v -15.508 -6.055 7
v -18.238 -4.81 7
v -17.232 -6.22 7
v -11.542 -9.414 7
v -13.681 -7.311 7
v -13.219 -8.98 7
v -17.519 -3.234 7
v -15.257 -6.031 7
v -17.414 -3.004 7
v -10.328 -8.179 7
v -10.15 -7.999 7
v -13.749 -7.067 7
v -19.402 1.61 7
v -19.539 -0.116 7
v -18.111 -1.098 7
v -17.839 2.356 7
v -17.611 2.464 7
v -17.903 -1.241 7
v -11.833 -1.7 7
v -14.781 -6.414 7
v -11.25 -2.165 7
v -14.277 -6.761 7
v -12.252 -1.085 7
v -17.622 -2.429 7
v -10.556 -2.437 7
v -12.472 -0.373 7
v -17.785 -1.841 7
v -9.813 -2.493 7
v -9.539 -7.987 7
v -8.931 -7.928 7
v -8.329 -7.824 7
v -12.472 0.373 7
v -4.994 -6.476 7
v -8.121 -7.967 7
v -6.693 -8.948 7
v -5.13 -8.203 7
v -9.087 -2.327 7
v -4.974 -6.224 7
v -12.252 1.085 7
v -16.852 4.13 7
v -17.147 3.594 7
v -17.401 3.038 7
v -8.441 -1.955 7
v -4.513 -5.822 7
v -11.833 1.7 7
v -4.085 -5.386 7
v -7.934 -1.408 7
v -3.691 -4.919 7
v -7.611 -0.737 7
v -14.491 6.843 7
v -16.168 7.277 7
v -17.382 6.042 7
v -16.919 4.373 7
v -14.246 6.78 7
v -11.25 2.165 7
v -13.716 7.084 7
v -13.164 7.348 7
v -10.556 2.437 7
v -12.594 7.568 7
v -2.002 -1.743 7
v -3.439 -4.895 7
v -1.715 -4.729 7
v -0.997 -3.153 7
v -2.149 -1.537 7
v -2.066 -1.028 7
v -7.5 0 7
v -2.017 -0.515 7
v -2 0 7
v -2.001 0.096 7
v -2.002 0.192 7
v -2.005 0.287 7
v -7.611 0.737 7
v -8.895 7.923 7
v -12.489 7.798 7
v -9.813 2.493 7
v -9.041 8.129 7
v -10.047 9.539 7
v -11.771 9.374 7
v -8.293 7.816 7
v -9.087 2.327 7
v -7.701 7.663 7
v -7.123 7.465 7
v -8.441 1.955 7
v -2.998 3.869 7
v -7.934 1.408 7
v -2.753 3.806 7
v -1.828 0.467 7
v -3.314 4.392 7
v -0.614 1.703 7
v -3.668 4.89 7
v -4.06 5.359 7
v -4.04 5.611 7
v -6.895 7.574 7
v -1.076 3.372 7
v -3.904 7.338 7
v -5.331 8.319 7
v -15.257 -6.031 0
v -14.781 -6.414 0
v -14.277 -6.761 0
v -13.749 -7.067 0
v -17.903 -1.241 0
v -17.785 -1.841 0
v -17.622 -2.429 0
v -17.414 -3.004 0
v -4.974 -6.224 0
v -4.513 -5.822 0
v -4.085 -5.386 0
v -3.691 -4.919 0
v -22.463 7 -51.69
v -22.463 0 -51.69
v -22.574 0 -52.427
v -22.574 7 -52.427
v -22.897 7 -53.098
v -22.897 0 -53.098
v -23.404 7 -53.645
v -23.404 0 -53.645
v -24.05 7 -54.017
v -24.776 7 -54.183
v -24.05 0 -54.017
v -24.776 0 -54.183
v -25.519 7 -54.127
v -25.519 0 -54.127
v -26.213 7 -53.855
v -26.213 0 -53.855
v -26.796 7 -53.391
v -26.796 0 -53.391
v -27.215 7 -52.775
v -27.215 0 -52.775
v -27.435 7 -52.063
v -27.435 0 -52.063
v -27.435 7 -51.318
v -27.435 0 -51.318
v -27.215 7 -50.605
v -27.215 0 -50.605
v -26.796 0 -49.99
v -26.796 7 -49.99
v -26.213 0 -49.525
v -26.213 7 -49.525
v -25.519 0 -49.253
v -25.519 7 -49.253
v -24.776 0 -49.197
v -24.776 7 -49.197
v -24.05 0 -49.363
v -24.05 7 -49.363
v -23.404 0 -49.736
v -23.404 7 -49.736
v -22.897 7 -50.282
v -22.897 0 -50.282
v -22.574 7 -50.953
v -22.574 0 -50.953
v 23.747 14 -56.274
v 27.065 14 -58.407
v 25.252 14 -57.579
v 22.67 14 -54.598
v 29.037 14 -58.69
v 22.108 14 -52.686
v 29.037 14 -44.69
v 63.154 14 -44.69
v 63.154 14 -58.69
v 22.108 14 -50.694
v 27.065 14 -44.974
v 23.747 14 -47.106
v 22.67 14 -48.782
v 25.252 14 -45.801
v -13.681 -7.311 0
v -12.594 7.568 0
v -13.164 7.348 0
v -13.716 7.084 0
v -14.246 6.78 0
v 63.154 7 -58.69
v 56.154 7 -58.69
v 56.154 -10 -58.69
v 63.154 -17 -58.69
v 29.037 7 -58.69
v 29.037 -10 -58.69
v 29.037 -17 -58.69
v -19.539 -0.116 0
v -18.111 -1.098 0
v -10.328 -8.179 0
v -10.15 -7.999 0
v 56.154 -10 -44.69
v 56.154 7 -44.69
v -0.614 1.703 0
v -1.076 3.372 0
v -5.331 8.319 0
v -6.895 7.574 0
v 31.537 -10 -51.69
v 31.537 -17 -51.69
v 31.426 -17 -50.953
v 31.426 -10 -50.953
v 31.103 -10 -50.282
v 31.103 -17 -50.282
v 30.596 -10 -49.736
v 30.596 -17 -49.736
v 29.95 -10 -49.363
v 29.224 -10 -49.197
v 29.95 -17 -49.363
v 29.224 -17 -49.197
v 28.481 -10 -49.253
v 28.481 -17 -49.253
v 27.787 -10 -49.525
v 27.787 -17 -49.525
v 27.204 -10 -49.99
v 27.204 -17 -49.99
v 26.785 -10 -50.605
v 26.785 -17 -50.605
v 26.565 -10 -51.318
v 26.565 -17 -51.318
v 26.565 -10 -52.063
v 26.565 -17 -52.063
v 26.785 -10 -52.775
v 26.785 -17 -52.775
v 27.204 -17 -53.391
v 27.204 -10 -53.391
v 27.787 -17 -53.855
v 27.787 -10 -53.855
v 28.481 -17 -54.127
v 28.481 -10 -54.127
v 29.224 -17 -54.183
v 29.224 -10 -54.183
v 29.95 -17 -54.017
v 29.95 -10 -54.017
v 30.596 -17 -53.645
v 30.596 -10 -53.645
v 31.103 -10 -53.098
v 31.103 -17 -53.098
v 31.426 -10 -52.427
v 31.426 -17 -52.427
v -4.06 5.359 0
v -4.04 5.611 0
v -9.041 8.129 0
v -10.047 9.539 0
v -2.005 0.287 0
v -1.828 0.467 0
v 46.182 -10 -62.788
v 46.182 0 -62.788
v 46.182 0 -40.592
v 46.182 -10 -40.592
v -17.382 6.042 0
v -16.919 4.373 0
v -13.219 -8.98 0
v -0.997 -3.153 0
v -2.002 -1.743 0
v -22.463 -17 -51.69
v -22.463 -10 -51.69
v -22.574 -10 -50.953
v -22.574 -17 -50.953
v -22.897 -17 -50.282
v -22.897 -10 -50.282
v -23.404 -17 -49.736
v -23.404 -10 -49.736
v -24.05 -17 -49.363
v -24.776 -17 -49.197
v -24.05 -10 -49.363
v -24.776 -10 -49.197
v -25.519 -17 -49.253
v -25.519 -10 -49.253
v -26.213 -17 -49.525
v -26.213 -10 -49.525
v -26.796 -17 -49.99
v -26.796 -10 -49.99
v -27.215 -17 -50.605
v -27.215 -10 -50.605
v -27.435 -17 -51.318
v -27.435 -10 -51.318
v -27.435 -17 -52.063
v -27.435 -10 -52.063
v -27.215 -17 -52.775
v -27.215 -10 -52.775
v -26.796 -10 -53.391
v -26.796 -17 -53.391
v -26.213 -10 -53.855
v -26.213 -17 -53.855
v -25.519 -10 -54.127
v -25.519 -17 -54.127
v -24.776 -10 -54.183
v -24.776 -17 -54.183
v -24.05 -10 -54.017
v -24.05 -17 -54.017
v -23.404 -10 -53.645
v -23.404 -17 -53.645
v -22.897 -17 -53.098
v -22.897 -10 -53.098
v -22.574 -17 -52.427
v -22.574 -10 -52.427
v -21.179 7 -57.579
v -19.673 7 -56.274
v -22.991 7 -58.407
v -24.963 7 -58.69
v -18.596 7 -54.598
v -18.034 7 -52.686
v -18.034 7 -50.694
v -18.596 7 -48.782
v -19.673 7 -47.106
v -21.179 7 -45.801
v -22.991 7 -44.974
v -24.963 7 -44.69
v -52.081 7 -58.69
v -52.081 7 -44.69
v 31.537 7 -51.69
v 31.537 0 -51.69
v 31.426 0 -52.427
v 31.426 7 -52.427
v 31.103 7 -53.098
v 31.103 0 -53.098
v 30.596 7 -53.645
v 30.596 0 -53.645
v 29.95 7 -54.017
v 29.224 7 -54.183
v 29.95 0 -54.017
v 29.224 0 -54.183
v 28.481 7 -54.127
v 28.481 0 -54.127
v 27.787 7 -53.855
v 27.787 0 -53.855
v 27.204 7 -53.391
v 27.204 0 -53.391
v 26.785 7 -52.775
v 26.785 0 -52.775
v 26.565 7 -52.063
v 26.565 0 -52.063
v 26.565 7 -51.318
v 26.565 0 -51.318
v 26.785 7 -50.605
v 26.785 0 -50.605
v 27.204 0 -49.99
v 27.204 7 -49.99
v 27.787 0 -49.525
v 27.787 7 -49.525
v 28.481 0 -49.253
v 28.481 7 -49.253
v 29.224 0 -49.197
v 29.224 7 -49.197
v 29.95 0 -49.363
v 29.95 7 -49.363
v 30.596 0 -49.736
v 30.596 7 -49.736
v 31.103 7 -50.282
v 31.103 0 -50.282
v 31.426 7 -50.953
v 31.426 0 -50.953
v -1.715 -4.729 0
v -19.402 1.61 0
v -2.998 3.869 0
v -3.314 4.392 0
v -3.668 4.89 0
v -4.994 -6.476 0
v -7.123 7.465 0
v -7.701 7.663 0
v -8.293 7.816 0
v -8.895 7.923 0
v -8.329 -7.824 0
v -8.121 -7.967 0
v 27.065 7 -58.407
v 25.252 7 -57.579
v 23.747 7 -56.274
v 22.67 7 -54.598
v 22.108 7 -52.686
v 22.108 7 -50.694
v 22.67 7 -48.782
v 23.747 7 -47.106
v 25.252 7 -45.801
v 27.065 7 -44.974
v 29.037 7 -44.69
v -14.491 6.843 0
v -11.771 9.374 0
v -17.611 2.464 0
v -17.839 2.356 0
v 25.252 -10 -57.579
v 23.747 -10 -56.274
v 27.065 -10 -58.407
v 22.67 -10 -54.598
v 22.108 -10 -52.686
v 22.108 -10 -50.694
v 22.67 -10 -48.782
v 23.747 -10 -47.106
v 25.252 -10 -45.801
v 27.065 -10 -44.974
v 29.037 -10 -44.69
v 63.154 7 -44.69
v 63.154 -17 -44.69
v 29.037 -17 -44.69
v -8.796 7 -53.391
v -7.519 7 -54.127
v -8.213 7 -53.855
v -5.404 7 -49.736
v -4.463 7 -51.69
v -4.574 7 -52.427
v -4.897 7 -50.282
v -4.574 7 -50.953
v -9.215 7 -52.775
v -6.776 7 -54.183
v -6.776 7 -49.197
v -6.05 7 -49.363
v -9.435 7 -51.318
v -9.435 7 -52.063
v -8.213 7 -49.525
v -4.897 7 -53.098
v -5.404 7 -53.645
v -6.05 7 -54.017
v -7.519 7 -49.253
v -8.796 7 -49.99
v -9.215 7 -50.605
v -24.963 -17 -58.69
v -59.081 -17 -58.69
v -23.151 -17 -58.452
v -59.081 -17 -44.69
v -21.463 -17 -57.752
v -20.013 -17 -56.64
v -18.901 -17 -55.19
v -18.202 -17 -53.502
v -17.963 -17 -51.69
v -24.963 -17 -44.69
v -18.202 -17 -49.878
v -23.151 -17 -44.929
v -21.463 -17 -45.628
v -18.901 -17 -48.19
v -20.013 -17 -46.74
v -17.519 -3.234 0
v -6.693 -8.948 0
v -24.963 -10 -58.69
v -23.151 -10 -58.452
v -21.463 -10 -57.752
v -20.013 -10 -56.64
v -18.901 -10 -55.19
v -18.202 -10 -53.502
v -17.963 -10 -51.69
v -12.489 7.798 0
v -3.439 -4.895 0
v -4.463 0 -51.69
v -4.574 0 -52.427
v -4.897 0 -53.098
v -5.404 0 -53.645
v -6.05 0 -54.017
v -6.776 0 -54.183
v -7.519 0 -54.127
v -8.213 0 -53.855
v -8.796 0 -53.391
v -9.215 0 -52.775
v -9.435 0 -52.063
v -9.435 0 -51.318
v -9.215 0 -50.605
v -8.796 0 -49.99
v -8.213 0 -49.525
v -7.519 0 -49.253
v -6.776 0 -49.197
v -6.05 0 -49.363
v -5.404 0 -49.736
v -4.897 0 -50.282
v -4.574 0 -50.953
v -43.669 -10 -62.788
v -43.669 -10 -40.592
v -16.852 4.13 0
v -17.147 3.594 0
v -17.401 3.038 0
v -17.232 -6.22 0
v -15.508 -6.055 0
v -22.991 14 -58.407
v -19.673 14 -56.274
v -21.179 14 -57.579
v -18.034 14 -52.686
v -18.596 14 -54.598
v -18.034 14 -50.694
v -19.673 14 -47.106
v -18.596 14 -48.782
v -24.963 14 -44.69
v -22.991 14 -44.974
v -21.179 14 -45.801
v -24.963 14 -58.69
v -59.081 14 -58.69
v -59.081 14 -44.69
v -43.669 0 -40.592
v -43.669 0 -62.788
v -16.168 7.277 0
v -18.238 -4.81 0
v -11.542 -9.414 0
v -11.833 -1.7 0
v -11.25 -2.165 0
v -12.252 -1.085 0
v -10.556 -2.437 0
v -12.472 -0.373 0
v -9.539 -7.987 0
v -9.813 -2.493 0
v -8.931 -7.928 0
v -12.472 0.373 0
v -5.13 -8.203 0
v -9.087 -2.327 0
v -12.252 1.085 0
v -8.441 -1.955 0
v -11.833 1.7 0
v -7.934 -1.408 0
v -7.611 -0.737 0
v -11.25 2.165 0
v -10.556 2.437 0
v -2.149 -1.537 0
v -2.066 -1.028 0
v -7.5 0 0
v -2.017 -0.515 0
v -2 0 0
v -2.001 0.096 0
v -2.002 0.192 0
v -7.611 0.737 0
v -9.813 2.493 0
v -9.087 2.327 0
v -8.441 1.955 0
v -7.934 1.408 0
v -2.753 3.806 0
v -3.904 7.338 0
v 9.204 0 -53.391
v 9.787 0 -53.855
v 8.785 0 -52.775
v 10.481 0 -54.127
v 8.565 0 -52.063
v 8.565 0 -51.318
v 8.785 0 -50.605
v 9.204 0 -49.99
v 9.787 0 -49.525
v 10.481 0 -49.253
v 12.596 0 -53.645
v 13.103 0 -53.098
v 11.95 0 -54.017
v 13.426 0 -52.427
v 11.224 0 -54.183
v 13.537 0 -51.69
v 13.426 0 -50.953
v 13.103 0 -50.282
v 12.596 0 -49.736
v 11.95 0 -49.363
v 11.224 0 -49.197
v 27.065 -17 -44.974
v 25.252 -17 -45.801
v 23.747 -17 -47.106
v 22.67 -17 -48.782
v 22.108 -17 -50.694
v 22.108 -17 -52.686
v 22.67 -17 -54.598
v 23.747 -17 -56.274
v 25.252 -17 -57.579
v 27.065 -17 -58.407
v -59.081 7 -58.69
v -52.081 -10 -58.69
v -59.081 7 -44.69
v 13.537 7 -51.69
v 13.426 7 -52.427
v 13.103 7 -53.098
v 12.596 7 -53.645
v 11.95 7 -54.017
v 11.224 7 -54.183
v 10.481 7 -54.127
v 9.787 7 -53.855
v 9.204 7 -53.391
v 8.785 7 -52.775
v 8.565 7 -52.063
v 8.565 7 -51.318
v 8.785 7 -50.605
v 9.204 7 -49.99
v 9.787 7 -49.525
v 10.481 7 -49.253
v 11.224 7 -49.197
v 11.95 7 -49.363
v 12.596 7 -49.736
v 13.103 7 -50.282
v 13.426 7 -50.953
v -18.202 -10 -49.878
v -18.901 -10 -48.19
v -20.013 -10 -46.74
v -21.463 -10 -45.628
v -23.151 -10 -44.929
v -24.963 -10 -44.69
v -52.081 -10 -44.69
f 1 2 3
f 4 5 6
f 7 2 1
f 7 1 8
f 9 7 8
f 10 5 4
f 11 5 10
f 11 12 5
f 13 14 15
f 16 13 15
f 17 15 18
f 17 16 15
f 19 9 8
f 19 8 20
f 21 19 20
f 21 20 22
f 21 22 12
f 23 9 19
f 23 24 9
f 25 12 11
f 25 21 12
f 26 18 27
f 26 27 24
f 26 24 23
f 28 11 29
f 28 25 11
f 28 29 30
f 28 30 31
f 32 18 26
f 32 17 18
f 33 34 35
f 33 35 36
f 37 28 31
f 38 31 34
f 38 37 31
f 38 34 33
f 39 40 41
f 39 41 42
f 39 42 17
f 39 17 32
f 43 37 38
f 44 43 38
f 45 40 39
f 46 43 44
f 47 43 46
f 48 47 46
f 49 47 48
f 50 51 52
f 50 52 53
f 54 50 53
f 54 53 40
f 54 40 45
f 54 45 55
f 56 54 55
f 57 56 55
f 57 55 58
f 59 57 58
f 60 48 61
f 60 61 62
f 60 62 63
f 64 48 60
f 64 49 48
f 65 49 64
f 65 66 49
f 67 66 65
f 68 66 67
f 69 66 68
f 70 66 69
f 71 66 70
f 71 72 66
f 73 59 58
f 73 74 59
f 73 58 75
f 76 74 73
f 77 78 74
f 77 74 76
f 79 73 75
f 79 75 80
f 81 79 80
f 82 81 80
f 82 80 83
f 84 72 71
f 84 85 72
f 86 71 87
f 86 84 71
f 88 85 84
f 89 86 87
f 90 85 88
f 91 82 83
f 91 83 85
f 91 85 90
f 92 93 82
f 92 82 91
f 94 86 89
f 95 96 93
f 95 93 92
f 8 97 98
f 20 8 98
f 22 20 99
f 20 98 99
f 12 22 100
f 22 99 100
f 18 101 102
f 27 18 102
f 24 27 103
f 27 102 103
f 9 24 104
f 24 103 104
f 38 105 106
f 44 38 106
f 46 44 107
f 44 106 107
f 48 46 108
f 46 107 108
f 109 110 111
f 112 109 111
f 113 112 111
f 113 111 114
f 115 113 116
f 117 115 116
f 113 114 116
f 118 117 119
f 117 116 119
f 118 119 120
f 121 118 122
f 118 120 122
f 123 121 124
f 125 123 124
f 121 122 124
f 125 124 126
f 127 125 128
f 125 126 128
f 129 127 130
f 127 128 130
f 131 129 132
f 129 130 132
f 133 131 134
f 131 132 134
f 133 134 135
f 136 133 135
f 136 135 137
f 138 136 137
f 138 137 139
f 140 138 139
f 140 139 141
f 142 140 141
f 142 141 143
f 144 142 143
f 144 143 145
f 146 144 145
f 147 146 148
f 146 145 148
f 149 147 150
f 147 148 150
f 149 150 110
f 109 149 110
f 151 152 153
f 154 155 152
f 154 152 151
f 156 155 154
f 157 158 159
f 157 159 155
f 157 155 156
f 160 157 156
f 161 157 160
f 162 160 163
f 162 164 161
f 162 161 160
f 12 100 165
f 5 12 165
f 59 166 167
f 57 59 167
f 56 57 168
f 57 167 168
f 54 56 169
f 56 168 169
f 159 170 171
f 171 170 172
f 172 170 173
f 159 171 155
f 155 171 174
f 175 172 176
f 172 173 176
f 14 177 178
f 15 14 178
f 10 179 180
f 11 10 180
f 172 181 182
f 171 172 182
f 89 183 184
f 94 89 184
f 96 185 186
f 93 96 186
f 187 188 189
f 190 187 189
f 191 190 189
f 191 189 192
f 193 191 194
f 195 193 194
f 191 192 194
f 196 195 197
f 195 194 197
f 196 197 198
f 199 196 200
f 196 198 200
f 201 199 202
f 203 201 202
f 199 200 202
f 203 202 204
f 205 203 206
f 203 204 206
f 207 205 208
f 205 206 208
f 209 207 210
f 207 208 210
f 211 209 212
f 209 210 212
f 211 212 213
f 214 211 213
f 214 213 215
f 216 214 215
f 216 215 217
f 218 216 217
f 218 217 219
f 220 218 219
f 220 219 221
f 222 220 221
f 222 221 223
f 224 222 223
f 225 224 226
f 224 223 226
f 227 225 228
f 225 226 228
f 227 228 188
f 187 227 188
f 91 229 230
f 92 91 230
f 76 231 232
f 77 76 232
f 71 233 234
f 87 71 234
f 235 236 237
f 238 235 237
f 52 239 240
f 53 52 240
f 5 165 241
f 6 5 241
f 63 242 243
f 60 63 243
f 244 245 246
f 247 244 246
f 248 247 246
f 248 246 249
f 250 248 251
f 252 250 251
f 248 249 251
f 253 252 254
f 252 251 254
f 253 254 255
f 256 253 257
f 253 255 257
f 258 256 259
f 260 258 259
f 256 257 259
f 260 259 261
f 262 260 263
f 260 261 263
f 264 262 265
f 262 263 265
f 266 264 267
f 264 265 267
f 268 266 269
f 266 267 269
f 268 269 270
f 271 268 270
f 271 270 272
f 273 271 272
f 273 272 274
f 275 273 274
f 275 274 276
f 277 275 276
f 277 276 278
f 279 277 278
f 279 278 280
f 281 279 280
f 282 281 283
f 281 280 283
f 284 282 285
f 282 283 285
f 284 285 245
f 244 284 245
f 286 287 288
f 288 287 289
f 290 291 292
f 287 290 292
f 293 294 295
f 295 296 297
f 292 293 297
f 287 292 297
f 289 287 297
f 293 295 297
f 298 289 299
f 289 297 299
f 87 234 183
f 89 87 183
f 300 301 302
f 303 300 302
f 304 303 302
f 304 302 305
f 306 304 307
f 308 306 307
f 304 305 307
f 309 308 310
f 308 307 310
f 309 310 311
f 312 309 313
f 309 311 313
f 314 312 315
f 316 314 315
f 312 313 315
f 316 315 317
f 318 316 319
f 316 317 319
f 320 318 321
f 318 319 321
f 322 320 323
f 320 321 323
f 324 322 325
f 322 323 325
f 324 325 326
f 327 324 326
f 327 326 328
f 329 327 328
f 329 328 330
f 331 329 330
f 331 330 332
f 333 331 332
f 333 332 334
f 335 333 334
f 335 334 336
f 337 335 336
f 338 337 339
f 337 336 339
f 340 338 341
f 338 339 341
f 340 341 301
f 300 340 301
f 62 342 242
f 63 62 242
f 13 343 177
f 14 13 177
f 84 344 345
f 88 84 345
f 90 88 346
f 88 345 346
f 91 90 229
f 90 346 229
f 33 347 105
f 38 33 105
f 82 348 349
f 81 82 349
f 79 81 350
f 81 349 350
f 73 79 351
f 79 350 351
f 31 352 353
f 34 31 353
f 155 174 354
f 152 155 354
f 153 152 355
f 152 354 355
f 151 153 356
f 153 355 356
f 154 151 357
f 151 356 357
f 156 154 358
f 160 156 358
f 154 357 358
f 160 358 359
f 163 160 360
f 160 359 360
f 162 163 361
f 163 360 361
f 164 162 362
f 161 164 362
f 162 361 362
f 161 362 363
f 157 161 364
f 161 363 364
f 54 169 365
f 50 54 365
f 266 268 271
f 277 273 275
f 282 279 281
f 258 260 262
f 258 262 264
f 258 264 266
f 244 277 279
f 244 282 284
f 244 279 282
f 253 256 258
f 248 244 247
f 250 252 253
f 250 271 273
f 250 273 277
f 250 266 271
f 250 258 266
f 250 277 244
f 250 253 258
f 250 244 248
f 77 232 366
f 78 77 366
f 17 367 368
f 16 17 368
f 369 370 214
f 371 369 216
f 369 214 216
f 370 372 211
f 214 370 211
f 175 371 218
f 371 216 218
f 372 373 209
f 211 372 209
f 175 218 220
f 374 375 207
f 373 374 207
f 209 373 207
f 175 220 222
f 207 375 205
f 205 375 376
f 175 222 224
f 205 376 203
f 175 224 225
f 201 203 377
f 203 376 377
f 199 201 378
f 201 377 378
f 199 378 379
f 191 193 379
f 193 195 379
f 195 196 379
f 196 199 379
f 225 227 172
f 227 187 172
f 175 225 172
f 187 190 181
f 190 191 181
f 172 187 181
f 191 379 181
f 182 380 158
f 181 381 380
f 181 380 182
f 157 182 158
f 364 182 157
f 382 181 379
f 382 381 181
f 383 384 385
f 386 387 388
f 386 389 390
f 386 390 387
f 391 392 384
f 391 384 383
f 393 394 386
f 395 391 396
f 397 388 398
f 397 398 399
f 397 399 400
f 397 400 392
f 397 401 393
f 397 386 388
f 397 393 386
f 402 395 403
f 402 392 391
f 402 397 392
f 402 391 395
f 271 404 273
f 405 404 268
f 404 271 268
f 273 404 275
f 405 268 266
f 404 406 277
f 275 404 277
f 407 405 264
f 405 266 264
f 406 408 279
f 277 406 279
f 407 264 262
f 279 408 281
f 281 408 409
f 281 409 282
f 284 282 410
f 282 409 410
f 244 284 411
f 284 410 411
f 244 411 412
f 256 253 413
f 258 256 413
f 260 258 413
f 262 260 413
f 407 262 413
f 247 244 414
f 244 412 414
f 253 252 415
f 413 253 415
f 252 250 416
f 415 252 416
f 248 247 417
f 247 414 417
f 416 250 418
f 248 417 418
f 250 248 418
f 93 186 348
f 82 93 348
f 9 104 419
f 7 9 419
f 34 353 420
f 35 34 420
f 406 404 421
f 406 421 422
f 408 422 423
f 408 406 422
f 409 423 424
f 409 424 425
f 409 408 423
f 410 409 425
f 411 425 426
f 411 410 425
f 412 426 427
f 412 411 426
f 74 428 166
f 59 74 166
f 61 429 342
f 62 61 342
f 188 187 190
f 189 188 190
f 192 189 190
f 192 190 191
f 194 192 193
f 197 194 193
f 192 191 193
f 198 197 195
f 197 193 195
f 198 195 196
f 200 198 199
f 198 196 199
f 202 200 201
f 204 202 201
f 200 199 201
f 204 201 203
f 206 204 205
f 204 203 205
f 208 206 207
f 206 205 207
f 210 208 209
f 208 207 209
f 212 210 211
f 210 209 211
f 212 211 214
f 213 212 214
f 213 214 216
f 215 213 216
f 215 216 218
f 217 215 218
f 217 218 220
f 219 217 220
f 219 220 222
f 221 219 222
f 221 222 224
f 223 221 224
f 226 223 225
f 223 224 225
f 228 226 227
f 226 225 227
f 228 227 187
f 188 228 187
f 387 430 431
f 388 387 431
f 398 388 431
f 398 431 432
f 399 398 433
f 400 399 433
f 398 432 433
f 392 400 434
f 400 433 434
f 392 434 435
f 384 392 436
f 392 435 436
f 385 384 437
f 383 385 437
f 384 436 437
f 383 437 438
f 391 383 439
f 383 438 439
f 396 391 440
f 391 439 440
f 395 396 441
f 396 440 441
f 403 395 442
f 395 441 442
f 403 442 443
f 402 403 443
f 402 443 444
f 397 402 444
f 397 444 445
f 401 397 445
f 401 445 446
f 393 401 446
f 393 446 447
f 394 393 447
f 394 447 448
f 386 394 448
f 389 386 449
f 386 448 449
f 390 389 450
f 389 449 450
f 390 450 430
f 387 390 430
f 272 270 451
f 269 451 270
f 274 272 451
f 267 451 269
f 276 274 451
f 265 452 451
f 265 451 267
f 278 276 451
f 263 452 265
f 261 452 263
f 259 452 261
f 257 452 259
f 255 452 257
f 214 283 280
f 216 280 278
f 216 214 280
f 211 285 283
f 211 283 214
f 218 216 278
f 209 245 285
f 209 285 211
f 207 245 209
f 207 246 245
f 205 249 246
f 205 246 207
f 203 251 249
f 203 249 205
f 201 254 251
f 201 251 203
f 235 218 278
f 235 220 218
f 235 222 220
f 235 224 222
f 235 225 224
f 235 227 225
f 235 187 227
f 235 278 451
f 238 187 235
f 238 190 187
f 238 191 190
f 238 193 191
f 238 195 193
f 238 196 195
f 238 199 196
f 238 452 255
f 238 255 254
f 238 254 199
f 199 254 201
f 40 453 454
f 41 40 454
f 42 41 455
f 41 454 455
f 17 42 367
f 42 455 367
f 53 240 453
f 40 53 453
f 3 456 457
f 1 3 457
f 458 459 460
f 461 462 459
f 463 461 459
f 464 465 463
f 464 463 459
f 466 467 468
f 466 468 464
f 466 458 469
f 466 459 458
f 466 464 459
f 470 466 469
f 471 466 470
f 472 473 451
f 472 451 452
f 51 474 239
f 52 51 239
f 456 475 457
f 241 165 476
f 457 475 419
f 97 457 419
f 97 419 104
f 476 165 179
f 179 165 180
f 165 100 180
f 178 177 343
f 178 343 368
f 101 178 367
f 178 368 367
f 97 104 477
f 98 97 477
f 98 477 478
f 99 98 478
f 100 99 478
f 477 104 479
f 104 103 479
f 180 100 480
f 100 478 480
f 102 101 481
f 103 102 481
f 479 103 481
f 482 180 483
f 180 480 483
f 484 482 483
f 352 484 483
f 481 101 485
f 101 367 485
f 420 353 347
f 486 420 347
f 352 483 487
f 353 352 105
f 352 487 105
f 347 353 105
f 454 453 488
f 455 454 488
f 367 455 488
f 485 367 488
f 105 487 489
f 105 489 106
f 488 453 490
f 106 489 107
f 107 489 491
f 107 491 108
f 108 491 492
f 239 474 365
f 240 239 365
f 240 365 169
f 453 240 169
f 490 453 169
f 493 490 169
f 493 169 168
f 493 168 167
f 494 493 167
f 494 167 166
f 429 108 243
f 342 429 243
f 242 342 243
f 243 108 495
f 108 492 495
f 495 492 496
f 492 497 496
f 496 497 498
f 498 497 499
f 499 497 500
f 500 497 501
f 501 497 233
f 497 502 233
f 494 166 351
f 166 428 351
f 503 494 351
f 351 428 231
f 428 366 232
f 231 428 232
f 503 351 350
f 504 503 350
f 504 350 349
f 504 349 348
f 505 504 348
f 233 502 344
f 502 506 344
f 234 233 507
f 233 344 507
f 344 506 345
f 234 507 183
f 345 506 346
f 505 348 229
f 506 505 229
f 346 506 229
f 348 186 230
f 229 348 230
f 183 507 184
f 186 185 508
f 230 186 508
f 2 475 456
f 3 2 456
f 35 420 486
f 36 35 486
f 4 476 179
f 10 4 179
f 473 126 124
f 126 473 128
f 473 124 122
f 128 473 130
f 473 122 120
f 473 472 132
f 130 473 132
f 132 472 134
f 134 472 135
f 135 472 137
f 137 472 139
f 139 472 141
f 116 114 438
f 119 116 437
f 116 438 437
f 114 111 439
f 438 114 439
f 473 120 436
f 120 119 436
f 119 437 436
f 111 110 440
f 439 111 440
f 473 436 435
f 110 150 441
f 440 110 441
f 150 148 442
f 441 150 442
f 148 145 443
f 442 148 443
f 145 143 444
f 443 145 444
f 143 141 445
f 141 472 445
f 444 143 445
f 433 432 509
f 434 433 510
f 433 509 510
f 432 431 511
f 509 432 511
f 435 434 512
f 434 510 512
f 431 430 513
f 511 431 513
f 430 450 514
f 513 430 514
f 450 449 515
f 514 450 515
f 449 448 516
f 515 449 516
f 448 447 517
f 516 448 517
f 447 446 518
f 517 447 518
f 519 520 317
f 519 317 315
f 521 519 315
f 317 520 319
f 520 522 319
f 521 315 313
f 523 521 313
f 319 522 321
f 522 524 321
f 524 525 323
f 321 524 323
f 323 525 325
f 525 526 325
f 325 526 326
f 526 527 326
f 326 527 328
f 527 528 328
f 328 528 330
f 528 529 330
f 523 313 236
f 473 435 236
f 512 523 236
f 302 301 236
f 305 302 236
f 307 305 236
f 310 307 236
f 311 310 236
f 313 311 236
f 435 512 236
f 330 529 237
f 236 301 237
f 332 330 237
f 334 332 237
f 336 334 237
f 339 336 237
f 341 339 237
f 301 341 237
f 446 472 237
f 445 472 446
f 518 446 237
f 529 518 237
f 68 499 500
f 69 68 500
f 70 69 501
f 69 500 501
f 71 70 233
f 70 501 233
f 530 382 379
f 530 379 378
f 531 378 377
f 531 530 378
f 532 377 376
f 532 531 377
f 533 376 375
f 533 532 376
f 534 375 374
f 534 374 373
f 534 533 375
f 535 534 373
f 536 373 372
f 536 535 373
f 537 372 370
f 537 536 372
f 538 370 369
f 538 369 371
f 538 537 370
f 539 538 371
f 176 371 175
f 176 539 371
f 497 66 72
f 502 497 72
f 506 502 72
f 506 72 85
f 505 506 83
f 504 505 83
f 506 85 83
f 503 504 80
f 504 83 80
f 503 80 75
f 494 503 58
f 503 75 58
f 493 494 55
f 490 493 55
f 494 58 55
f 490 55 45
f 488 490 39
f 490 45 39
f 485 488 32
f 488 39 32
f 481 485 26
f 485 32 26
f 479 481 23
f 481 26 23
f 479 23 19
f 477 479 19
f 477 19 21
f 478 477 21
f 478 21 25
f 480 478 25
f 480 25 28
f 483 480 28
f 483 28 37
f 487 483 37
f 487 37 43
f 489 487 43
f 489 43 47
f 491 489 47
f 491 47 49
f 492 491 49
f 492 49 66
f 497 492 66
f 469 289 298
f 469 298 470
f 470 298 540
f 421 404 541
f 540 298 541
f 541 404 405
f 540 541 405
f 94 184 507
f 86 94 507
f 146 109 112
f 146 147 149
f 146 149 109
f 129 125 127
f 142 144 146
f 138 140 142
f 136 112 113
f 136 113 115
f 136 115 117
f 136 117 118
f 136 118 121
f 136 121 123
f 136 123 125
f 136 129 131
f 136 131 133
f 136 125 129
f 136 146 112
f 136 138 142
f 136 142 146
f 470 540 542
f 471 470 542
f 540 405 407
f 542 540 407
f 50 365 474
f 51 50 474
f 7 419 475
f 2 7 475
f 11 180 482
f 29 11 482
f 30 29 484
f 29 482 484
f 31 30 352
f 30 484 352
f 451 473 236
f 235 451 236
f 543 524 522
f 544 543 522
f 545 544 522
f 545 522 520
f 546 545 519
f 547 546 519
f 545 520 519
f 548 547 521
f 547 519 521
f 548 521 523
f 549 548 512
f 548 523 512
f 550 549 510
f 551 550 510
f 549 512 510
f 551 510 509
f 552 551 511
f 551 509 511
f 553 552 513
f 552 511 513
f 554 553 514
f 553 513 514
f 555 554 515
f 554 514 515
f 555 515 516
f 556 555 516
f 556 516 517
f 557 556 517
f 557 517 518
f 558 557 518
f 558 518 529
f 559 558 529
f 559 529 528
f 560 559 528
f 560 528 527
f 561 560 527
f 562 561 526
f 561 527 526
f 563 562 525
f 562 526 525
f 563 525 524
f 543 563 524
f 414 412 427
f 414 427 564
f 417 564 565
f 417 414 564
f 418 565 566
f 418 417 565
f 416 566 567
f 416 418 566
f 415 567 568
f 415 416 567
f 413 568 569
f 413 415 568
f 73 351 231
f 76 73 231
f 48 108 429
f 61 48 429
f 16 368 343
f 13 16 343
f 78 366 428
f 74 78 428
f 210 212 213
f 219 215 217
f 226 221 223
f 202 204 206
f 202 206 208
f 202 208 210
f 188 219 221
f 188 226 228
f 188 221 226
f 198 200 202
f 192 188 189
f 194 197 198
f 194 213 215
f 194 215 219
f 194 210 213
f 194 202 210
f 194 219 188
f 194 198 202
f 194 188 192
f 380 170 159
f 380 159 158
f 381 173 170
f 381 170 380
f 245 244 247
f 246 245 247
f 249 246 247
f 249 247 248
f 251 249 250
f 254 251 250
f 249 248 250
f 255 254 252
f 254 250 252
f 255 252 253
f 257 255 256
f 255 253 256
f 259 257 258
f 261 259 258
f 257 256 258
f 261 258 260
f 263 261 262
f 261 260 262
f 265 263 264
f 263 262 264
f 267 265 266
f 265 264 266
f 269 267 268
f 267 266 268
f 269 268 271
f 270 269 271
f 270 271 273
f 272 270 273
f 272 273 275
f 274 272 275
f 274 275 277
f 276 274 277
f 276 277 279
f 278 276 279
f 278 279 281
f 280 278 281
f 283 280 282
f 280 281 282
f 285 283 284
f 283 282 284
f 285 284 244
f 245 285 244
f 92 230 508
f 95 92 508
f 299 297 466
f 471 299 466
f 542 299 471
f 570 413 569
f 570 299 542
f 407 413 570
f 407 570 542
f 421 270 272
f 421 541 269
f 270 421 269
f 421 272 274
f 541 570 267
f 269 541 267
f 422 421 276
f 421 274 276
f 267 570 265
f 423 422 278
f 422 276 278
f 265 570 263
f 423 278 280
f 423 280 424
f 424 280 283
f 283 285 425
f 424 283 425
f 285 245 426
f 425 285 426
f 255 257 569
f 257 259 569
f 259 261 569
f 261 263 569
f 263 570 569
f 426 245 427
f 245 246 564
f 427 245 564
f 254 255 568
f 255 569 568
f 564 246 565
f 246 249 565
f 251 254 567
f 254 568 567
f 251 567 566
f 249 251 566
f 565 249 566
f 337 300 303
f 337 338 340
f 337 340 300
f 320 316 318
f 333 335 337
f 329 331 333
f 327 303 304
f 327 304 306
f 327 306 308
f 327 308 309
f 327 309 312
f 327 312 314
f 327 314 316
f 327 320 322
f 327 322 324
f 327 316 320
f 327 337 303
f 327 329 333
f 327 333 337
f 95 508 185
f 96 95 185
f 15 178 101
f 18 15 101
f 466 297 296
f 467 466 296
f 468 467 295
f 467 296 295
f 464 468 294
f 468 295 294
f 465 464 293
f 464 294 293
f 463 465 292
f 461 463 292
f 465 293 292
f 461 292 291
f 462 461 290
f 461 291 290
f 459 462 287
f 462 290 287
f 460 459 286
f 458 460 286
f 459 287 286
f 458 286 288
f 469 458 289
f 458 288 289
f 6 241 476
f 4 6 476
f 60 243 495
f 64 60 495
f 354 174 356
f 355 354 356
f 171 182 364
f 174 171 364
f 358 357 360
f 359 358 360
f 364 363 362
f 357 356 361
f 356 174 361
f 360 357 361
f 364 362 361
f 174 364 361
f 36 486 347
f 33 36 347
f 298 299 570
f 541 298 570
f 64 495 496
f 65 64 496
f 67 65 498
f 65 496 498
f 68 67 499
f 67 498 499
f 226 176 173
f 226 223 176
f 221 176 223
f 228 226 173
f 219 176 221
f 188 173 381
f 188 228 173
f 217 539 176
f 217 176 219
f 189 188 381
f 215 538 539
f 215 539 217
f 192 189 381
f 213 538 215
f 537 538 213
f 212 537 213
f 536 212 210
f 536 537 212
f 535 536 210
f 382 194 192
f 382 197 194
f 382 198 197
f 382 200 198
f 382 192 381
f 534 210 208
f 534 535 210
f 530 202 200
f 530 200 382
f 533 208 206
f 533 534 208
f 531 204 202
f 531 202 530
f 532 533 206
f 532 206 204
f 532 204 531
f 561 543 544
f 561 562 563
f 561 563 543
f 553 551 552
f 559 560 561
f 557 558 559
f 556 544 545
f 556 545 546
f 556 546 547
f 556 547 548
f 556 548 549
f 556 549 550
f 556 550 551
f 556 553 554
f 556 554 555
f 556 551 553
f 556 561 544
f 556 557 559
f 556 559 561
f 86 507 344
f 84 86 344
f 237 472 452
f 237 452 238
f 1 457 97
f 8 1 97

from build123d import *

# Parameters (mm, degrees)
F1_DEPTH  = 7
F2_R      = 2.5
F3_DEPTH  = 25
F4_W      = 89.8504182696
F4_H      = 22.1967101097
F5_DEPTH  = 10
F7_DEPTH  = 7
F8_R      = 2.5
F9_DEPTH  = 7
F10_R     = 2.5
F11_DEPTH = 7
F12_W     = 24
F12_H     = 14
F13_DEPTH = 7
F14_W     = 34.1175030857
F14_H     = 14
F15_DEPTH = 7
F16_W     = 24
F16_H     = 14
F17_DEPTH = 7
F18_W     = 34.1175030857
F18_H     = 14
F19_DEPTH = 7


with BuildPart() as f1:
    # F0 (on Top) → F1 (new body)
    with BuildSketch(Plane.XY):
        with BuildLine():
            ThreePointArc((-2.1490524557, -1.5370825146), (-2.0373503043, -0.7721462444), (-2, 0))
            ThreePointArc((-2, 0), (-2.0012895065, 0.1436330113), (-2.0051576105, 0.2872197187))
            ThreePointArc((-2.0051576105, 0.2872197187), (-2.2905847902, 2.136566667), (-2.997807665, 3.8690182869))
            ThreePointArc((-2.997807665, 3.8690182869), (-3.4862682544, 4.6444912258), (-4.0602166903, 5.3590086988))
            ThreePointArc((-4.0602166903, 5.3590086988), (-5.4676038996, 6.5922215974), (-7.1229664886, 7.4647624325))
            ThreePointArc((-7.1229664886, 7.4647624325), (-7.9956134055, 7.7448327535), (-8.8945663941, 7.92325795))
            ThreePointArc((-8.8945663941, 7.92325795), (-10.7653815164, 7.963302778), (-12.5943212668, 7.5676612744))
            ThreePointArc((-12.5943212668, 7.5676612744), (-13.4428333205, 7.2212809617), (-14.2461607676, 6.7801267492))
            ThreePointArc((-14.2461607676, 6.7801267492), (-15.7050286154, 5.6082660866), (-16.8517642916, 4.1295673009))
            ThreePointArc((-16.8517642916, 4.1295673009), (-17.279113262, 3.3188115522), (-17.6109293271, 2.4644988897))
            ThreePointArc((-17.6109293271, 2.4644988897), (-17.9752294209, 0.6290593643), (-17.9031906555, -1.2407971078))
            ThreePointArc((-17.9031906555, -1.2407971078), (-17.7094152098, -2.136566667), (-17.4144594684, -3.0042953901))
            ThreePointArc((-17.4144594684, -3.0042953901), (-16.5137317456, -4.6444912258), (-15.2566262775, -6.0305787598))
            ThreePointArc((-15.2566262775, -6.0305787598), (-14.5323961004, -6.5922215974), (-13.7486816219, -7.0673464679))
            ThreePointArc((-13.7486816219, -7.0673464679), (-12.0043865945, -7.7448327535), (-10.1504280434, -7.9985855877))
            ThreePointArc((-10.1504280434, -7.9985855877), (-9.2346184836, -7.963302778), (-8.3288539826, -7.8235075886))
            ThreePointArc((-8.3288539826, -7.8235075886), (-6.5571666795, -7.2212809617), (-4.9738428559, -6.2239653247))
            ThreePointArc((-4.9738428559, -6.2239653247), (-4.2949713846, -5.6082660866), (-3.6909741375, -4.9189625599))
            ThreePointArc((-3.6909741375, -4.9189625599), (-2.720886738, -3.3188115522), (-2.1490524557, -1.5370825146))
        make_face()
        with BuildLine():
            ThreePointArc((-2.997807665, 3.8690182869), (-2.2905847902, 2.136566667), (-2.0051576105, 0.2872197187))
            Line((-2.0051576105, 0.2872197187), (-1.8280045375, 0.4674293119))
            Line((-1.8280045375, 0.4674293119), (-0.613779312, 1.7026042395))
            Line((-0.613779312, 1.7026042395), (-1.0763595646, 3.3717415945))
            Line((-1.0763595646, 3.3717415945), (-2.7531650428, 3.805704022))
            Line((-2.7531650428, 3.805704022), (-2.997807665, 3.8690182869))
        make_face()
        with BuildLine():
            Line((-2.0023429594, -1.7428373018), (-2.1490524557, -1.5370825146))
            ThreePointArc((-2.1490524557, -1.5370825146), (-2.720886738, -3.3188115522), (-3.6909741375, -4.9189625599))
            Line((-3.6909741375, -4.9189625599), (-3.4394305167, -4.8947858027))
            Line((-3.4394305167, -4.8947858027), (-1.7153248907, -4.7290758435))
            Line((-1.7153248907, -4.7290758435), (-0.9967811121, -3.153101593))
            Line((-0.9967811121, -3.153101593), (-2.0023429594, -1.7428373018))
        make_face()
        with BuildLine():
            ThreePointArc((-7.1229664886, 7.4647624325), (-5.4676038996, 6.5922215974), (-4.0602166903, 5.3590086988))
            Line((-4.0602166903, 5.3590086988), (-4.0403460569, 5.6109290566))
            Line((-4.0403460569, 5.6109290566), (-3.9041507094, 7.3376168765))
            Line((-3.9041507094, 7.3376168765), (-5.3314085521, 8.3189094173))
            Line((-5.3314085521, 8.3189094173), (-6.8948617423, 7.5735141381))
            Line((-6.8948617423, 7.5735141381), (-7.1229664886, 7.4647624325))
        make_face()
        with BuildLine():
            Line((-4.9937134893, -6.4758856825), (-4.9738428559, -6.2239653247))
            ThreePointArc((-4.9738428559, -6.2239653247), (-6.5571666795, -7.2212809617), (-8.3288539826, -7.8235075886))
            Line((-8.3288539826, -7.8235075886), (-8.1206198697, -7.9666762408))
            Line((-8.1206198697, -7.9666762408), (-6.693362027, -8.9479687815))
            Line((-6.693362027, -8.9479687815), (-5.1299088368, -8.2025735024))
            Line((-5.1299088368, -8.2025735024), (-4.9937134893, -6.4758856825))
        make_face()
        with BuildLine():
            ThreePointArc((-12.5943212668, 7.5676612744), (-10.7653815164, 7.963302778), (-8.8945663941, 7.92325795))
            Line((-8.8945663941, 7.92325795), (-9.0412758904, 8.1290127372))
            Line((-9.0412758904, 8.1290127372), (-10.0468377377, 9.5392770285))
            Line((-10.0468377377, 9.5392770285), (-11.7709433637, 9.3735670693))
            Line((-11.7709433637, 9.3735670693), (-12.4894871423, 7.7975928188))
            Line((-12.4894871423, 7.7975928188), (-12.5943212668, 7.5676612744))
        make_face()
        with BuildLine():
            Line((-10.3275811163, -8.178795181), (-10.1504280434, -7.9985855877))
            ThreePointArc((-10.1504280434, -7.9985855877), (-12.0043865945, -7.7448327535), (-13.7486816219, -7.0673464679))
            Line((-13.7486816219, -7.0673464679), (-13.6811920726, -7.3108703261))
            Line((-13.6811920726, -7.3108703261), (-13.21861182, -8.9800076811))
            Line((-13.21861182, -8.9800076811), (-11.5418063418, -9.4139701085))
            Line((-11.5418063418, -9.4139701085), (-10.3275811163, -8.178795181))
        make_face()
        with BuildLine():
            ThreePointArc((-16.8517642916, 4.1295673009), (-15.7050286154, 5.6082660866), (-14.2461607676, 6.7801267492))
            Line((-14.2461607676, 6.7801267492), (-14.4908033898, 6.8434410141))
            Line((-14.4908033898, 6.8434410141), (-16.167608868, 7.2774034416))
            Line((-16.167608868, 7.2774034416), (-17.3818340935, 6.042228514))
            Line((-17.3818340935, 6.042228514), (-16.9192538409, 4.373091159))
            Line((-16.9192538409, 4.373091159), (-16.8517642916, 4.1295673009))
        make_face()
        with BuildLine():
            Line((-15.5081698983, -6.0547555171), (-15.2566262775, -6.0305787598))
            ThreePointArc((-15.2566262775, -6.0305787598), (-16.5137317456, -4.6444912258), (-17.4144594684, -3.0042953901))
            Line((-17.4144594684, -3.0042953901), (-17.5192935929, -3.2342269345))
            Line((-17.5192935929, -3.2342269345), (-18.2378373715, -4.810201185))
            Line((-18.2378373715, -4.810201185), (-17.2322755243, -6.2204654763))
            Line((-17.2322755243, -6.2204654763), (-15.5081698983, -6.0547555171))
        make_face()
        with BuildLine():
            ThreePointArc((-17.9031906555, -1.2407971078), (-17.9752294209, 0.6290593643), (-17.6109293271, 2.4644988897))
            Line((-17.6109293271, 2.4644988897), (-17.8390340734, 2.3557471842))
            Line((-17.8390340734, 2.3557471842), (-19.4024872636, 1.610351905))
            Line((-19.4024872636, 1.610351905), (-19.5386826111, -0.1163359149))
            Line((-19.5386826111, -0.1163359149), (-18.1114247684, -1.0976284556))
            Line((-18.1114247684, -1.0976284556), (-17.9031906555, -1.2407971078))
        make_face()
    extrude(amount=F1_DEPTH)

    # F2 (on face) → F3 (cut)
    with BuildSketch(Plane.XY.offset(7)):
        with Locations((-10, 0)):
            Circle(F2_R)
    extrude(amount=-F3_DEPTH, mode=Mode.SUBTRACT)


with BuildPart() as f5:
    # F4 (on Front) → F5 (new body)
    with BuildSketch(Plane.XZ):
        with Locations((1.256480813, -51.6901165247)):
            Rectangle(F4_W, F4_H)
    extrude(amount=F5_DEPTH)

    # F6 (on face) → F7 (join)
    with BuildSketch(Plane(origin=(0, 0, 0), x_dir=(-1, 0, 0), z_dir=(0, 1, 0))):
        with BuildLine():
            Line((-31.5369670838, -51.6901165247), (-26.5369670838, -51.6901165247))
            ThreePointArc((-26.5369670838, -51.6901165247), (-29.0369670838, -49.1901165247), (-31.5369670838, -51.6901165247))
        make_face()
        with BuildLine():
            ThreePointArc((-31.5369670838, -51.6901165247), (-29.0369670838, -54.1901165247), (-26.5369670838, -51.6901165247))
            Line((-26.5369670838, -51.6901165247), (-31.5369670838, -51.6901165247))
        make_face()
        with BuildLine():
            ThreePointArc((-8.5369670838, -51.6901165247), (-11.0369670838, -49.1901165247), (-13.5369670838, -51.6901165247))
            Line((-13.5369670838, -51.6901165247), (-8.5369670838, -51.6901165247))
        make_face()
        with BuildLine():
            Line((-8.5369670838, -51.6901165247), (-13.5369670838, -51.6901165247))
            ThreePointArc((-13.5369670838, -51.6901165247), (-11.0369670838, -54.1901165247), (-8.5369670838, -51.6901165247))
        make_face()
        with BuildLine():
            ThreePointArc((9.4630329162, -51.6901165247), (6.9630329162, -49.1901165247), (4.4630329162, -51.6901165247))
            Line((4.4630329162, -51.6901165247), (9.4630329162, -51.6901165247))
        make_face()
        with BuildLine():
            Line((9.4630329162, -51.6901165247), (4.4630329162, -51.6901165247))
            ThreePointArc((4.4630329162, -51.6901165247), (6.9630329162, -54.1901165247), (9.4630329162, -51.6901165247))
        make_face()
        with BuildLine():
            ThreePointArc((27.4630329162, -51.6901165247), (24.9630329162, -49.1901165247), (22.4630329162, -51.6901165247))
            Line((22.4630329162, -51.6901165247), (27.4630329162, -51.6901165247))
        make_face()
        with BuildLine():
            Line((27.4630329162, -51.6901165247), (22.4630329162, -51.6901165247))
            ThreePointArc((22.4630329162, -51.6901165247), (24.9630329162, -54.1901165247), (27.4630329162, -51.6901165247))
        make_face()
    extrude(amount=F7_DEPTH)

    # F8 (on face) → F9 (join)
    with BuildSketch(Plane.XZ.offset(10)):
        with Locations((-24.9630329162, -51.6901165247)):
            Circle(F8_R)
        with Locations((29.0369670838, -51.6901165247)):
            Circle(F8_R)
    extrude(amount=F9_DEPTH)


with BuildPart() as f11:
    # F10 (on face) → F11 (new body)
    with BuildSketch(Plane.XZ.offset(17)):
        with BuildLine():
            ThreePointArc((-24.9630329162, -58.6901165247), (-20.0132854479, -56.639863993), (-17.9630329162, -51.6901165247))
            ThreePointArc((-17.9630329162, -51.6901165247), (-20.0132854479, -46.7403690564), (-24.9630329162, -44.6901165247))
            ThreePointArc((-24.9630329162, -44.6901165247), (-31.9630329162, -51.6901165247), (-24.9630329162, -58.6901165247))
        make_face()
        with Locations((-24.9630329162, -51.6901165247)):
            Circle(F10_R, mode=Mode.SUBTRACT)
        with BuildLine():
            ThreePointArc((-24.9630329162, -58.6901165247), (-31.9630329162, -51.6901165247), (-24.9630329162, -44.6901165247))
            Line((-24.9630329162, -44.6901165247), (-52.0805360019, -44.6901165247))
            Line((-52.0805360019, -44.6901165247), (-52.0805360019, -58.6901165247))
            Line((-52.0805360019, -58.6901165247), (-24.9630329162, -58.6901165247))
        make_face()
    extrude(amount=-F11_DEPTH)

    # F12 (on face) → F13 (join)
    with BuildSketch(Plane(origin=(-52.0805360019, 0, 0), x_dir=(0, -1, 0), z_dir=(-1, 0, 0))):
        with Locations((5, -51.6901165247)):
            Rectangle(F12_W, F12_H)
    extrude(amount=F13_DEPTH)

    # F14 (on face) → F15 (join)
    with BuildSketch(Plane(origin=(0, 7, 0), x_dir=(-1, 0, 0), z_dir=(0, 1, 0))):
        with Locations((42.0217844591, -51.6901165247)):
            Rectangle(F14_W, F14_H)
        with BuildLine():
            ThreePointArc((24.9630329162, -44.6901165247), (17.9630329162, -51.6901165247), (24.9630329162, -58.6901165247))
            Line((24.9630329162, -58.6901165247), (24.9630329162, -44.6901165247))
        make_face()
    extrude(amount=F15_DEPTH)


with BuildPart() as f11b:
    # F10 (on face) → F11, piece 2 (new body)
    with BuildSketch(Plane.XZ.offset(17)):
        with BuildLine():
            ThreePointArc((29.0369670838, -58.6901165247), (33.9867145521, -56.639863993), (36.0369670838, -51.6901165247))
            ThreePointArc((36.0369670838, -51.6901165247), (33.9867145521, -46.7403690564), (29.0369670838, -44.6901165247))
            ThreePointArc((29.0369670838, -44.6901165247), (22.0369670838, -51.6901165247), (29.0369670838, -58.6901165247))
        make_face()
        with Locations((29.0369670838, -51.6901165247)):
            Circle(F10_R, mode=Mode.SUBTRACT)
        with BuildLine():
            ThreePointArc((29.0369670838, -44.6901165247), (33.9867145521, -46.7403690564), (36.0369670838, -51.6901165247))
            ThreePointArc((36.0369670838, -51.6901165247), (33.9867145521, -56.639863993), (29.0369670838, -58.6901165247))
            Line((29.0369670838, -58.6901165247), (56.1544701695, -58.6901165247))
            Line((56.1544701695, -58.6901165247), (56.1544701695, -44.6901165247))
            Line((56.1544701695, -44.6901165247), (29.0369670838, -44.6901165247))
        make_face()
    extrude(amount=-F11_DEPTH)

    # F16 (on face) → F17 (join)
    with BuildSketch(Plane.YZ.offset(56.1544701695)):
        with Locations((-5, -51.6901165247)):
            Rectangle(F16_W, F16_H)
    extrude(amount=F17_DEPTH)

    # F18 (on face) → F19 (join)
    with BuildSketch(Plane(origin=(0, 7, 0), x_dir=(-1, 0, 0), z_dir=(0, 1, 0))):
        with Locations((-46.0957186267, -51.6901165247)):
            Rectangle(F18_W, F18_H)
        with BuildLine():
            Line((-29.0369670838, -44.6901165247), (-29.0369670838, -58.6901165247))
            ThreePointArc((-29.0369670838, -58.6901165247), (-22.0369670838, -51.6901165247), (-29.0369670838, -44.6901165247))
        make_face()
    extrude(amount=F19_DEPTH)


solid = Compound([f1.part, f5.part, f11.part, f11b.part])
